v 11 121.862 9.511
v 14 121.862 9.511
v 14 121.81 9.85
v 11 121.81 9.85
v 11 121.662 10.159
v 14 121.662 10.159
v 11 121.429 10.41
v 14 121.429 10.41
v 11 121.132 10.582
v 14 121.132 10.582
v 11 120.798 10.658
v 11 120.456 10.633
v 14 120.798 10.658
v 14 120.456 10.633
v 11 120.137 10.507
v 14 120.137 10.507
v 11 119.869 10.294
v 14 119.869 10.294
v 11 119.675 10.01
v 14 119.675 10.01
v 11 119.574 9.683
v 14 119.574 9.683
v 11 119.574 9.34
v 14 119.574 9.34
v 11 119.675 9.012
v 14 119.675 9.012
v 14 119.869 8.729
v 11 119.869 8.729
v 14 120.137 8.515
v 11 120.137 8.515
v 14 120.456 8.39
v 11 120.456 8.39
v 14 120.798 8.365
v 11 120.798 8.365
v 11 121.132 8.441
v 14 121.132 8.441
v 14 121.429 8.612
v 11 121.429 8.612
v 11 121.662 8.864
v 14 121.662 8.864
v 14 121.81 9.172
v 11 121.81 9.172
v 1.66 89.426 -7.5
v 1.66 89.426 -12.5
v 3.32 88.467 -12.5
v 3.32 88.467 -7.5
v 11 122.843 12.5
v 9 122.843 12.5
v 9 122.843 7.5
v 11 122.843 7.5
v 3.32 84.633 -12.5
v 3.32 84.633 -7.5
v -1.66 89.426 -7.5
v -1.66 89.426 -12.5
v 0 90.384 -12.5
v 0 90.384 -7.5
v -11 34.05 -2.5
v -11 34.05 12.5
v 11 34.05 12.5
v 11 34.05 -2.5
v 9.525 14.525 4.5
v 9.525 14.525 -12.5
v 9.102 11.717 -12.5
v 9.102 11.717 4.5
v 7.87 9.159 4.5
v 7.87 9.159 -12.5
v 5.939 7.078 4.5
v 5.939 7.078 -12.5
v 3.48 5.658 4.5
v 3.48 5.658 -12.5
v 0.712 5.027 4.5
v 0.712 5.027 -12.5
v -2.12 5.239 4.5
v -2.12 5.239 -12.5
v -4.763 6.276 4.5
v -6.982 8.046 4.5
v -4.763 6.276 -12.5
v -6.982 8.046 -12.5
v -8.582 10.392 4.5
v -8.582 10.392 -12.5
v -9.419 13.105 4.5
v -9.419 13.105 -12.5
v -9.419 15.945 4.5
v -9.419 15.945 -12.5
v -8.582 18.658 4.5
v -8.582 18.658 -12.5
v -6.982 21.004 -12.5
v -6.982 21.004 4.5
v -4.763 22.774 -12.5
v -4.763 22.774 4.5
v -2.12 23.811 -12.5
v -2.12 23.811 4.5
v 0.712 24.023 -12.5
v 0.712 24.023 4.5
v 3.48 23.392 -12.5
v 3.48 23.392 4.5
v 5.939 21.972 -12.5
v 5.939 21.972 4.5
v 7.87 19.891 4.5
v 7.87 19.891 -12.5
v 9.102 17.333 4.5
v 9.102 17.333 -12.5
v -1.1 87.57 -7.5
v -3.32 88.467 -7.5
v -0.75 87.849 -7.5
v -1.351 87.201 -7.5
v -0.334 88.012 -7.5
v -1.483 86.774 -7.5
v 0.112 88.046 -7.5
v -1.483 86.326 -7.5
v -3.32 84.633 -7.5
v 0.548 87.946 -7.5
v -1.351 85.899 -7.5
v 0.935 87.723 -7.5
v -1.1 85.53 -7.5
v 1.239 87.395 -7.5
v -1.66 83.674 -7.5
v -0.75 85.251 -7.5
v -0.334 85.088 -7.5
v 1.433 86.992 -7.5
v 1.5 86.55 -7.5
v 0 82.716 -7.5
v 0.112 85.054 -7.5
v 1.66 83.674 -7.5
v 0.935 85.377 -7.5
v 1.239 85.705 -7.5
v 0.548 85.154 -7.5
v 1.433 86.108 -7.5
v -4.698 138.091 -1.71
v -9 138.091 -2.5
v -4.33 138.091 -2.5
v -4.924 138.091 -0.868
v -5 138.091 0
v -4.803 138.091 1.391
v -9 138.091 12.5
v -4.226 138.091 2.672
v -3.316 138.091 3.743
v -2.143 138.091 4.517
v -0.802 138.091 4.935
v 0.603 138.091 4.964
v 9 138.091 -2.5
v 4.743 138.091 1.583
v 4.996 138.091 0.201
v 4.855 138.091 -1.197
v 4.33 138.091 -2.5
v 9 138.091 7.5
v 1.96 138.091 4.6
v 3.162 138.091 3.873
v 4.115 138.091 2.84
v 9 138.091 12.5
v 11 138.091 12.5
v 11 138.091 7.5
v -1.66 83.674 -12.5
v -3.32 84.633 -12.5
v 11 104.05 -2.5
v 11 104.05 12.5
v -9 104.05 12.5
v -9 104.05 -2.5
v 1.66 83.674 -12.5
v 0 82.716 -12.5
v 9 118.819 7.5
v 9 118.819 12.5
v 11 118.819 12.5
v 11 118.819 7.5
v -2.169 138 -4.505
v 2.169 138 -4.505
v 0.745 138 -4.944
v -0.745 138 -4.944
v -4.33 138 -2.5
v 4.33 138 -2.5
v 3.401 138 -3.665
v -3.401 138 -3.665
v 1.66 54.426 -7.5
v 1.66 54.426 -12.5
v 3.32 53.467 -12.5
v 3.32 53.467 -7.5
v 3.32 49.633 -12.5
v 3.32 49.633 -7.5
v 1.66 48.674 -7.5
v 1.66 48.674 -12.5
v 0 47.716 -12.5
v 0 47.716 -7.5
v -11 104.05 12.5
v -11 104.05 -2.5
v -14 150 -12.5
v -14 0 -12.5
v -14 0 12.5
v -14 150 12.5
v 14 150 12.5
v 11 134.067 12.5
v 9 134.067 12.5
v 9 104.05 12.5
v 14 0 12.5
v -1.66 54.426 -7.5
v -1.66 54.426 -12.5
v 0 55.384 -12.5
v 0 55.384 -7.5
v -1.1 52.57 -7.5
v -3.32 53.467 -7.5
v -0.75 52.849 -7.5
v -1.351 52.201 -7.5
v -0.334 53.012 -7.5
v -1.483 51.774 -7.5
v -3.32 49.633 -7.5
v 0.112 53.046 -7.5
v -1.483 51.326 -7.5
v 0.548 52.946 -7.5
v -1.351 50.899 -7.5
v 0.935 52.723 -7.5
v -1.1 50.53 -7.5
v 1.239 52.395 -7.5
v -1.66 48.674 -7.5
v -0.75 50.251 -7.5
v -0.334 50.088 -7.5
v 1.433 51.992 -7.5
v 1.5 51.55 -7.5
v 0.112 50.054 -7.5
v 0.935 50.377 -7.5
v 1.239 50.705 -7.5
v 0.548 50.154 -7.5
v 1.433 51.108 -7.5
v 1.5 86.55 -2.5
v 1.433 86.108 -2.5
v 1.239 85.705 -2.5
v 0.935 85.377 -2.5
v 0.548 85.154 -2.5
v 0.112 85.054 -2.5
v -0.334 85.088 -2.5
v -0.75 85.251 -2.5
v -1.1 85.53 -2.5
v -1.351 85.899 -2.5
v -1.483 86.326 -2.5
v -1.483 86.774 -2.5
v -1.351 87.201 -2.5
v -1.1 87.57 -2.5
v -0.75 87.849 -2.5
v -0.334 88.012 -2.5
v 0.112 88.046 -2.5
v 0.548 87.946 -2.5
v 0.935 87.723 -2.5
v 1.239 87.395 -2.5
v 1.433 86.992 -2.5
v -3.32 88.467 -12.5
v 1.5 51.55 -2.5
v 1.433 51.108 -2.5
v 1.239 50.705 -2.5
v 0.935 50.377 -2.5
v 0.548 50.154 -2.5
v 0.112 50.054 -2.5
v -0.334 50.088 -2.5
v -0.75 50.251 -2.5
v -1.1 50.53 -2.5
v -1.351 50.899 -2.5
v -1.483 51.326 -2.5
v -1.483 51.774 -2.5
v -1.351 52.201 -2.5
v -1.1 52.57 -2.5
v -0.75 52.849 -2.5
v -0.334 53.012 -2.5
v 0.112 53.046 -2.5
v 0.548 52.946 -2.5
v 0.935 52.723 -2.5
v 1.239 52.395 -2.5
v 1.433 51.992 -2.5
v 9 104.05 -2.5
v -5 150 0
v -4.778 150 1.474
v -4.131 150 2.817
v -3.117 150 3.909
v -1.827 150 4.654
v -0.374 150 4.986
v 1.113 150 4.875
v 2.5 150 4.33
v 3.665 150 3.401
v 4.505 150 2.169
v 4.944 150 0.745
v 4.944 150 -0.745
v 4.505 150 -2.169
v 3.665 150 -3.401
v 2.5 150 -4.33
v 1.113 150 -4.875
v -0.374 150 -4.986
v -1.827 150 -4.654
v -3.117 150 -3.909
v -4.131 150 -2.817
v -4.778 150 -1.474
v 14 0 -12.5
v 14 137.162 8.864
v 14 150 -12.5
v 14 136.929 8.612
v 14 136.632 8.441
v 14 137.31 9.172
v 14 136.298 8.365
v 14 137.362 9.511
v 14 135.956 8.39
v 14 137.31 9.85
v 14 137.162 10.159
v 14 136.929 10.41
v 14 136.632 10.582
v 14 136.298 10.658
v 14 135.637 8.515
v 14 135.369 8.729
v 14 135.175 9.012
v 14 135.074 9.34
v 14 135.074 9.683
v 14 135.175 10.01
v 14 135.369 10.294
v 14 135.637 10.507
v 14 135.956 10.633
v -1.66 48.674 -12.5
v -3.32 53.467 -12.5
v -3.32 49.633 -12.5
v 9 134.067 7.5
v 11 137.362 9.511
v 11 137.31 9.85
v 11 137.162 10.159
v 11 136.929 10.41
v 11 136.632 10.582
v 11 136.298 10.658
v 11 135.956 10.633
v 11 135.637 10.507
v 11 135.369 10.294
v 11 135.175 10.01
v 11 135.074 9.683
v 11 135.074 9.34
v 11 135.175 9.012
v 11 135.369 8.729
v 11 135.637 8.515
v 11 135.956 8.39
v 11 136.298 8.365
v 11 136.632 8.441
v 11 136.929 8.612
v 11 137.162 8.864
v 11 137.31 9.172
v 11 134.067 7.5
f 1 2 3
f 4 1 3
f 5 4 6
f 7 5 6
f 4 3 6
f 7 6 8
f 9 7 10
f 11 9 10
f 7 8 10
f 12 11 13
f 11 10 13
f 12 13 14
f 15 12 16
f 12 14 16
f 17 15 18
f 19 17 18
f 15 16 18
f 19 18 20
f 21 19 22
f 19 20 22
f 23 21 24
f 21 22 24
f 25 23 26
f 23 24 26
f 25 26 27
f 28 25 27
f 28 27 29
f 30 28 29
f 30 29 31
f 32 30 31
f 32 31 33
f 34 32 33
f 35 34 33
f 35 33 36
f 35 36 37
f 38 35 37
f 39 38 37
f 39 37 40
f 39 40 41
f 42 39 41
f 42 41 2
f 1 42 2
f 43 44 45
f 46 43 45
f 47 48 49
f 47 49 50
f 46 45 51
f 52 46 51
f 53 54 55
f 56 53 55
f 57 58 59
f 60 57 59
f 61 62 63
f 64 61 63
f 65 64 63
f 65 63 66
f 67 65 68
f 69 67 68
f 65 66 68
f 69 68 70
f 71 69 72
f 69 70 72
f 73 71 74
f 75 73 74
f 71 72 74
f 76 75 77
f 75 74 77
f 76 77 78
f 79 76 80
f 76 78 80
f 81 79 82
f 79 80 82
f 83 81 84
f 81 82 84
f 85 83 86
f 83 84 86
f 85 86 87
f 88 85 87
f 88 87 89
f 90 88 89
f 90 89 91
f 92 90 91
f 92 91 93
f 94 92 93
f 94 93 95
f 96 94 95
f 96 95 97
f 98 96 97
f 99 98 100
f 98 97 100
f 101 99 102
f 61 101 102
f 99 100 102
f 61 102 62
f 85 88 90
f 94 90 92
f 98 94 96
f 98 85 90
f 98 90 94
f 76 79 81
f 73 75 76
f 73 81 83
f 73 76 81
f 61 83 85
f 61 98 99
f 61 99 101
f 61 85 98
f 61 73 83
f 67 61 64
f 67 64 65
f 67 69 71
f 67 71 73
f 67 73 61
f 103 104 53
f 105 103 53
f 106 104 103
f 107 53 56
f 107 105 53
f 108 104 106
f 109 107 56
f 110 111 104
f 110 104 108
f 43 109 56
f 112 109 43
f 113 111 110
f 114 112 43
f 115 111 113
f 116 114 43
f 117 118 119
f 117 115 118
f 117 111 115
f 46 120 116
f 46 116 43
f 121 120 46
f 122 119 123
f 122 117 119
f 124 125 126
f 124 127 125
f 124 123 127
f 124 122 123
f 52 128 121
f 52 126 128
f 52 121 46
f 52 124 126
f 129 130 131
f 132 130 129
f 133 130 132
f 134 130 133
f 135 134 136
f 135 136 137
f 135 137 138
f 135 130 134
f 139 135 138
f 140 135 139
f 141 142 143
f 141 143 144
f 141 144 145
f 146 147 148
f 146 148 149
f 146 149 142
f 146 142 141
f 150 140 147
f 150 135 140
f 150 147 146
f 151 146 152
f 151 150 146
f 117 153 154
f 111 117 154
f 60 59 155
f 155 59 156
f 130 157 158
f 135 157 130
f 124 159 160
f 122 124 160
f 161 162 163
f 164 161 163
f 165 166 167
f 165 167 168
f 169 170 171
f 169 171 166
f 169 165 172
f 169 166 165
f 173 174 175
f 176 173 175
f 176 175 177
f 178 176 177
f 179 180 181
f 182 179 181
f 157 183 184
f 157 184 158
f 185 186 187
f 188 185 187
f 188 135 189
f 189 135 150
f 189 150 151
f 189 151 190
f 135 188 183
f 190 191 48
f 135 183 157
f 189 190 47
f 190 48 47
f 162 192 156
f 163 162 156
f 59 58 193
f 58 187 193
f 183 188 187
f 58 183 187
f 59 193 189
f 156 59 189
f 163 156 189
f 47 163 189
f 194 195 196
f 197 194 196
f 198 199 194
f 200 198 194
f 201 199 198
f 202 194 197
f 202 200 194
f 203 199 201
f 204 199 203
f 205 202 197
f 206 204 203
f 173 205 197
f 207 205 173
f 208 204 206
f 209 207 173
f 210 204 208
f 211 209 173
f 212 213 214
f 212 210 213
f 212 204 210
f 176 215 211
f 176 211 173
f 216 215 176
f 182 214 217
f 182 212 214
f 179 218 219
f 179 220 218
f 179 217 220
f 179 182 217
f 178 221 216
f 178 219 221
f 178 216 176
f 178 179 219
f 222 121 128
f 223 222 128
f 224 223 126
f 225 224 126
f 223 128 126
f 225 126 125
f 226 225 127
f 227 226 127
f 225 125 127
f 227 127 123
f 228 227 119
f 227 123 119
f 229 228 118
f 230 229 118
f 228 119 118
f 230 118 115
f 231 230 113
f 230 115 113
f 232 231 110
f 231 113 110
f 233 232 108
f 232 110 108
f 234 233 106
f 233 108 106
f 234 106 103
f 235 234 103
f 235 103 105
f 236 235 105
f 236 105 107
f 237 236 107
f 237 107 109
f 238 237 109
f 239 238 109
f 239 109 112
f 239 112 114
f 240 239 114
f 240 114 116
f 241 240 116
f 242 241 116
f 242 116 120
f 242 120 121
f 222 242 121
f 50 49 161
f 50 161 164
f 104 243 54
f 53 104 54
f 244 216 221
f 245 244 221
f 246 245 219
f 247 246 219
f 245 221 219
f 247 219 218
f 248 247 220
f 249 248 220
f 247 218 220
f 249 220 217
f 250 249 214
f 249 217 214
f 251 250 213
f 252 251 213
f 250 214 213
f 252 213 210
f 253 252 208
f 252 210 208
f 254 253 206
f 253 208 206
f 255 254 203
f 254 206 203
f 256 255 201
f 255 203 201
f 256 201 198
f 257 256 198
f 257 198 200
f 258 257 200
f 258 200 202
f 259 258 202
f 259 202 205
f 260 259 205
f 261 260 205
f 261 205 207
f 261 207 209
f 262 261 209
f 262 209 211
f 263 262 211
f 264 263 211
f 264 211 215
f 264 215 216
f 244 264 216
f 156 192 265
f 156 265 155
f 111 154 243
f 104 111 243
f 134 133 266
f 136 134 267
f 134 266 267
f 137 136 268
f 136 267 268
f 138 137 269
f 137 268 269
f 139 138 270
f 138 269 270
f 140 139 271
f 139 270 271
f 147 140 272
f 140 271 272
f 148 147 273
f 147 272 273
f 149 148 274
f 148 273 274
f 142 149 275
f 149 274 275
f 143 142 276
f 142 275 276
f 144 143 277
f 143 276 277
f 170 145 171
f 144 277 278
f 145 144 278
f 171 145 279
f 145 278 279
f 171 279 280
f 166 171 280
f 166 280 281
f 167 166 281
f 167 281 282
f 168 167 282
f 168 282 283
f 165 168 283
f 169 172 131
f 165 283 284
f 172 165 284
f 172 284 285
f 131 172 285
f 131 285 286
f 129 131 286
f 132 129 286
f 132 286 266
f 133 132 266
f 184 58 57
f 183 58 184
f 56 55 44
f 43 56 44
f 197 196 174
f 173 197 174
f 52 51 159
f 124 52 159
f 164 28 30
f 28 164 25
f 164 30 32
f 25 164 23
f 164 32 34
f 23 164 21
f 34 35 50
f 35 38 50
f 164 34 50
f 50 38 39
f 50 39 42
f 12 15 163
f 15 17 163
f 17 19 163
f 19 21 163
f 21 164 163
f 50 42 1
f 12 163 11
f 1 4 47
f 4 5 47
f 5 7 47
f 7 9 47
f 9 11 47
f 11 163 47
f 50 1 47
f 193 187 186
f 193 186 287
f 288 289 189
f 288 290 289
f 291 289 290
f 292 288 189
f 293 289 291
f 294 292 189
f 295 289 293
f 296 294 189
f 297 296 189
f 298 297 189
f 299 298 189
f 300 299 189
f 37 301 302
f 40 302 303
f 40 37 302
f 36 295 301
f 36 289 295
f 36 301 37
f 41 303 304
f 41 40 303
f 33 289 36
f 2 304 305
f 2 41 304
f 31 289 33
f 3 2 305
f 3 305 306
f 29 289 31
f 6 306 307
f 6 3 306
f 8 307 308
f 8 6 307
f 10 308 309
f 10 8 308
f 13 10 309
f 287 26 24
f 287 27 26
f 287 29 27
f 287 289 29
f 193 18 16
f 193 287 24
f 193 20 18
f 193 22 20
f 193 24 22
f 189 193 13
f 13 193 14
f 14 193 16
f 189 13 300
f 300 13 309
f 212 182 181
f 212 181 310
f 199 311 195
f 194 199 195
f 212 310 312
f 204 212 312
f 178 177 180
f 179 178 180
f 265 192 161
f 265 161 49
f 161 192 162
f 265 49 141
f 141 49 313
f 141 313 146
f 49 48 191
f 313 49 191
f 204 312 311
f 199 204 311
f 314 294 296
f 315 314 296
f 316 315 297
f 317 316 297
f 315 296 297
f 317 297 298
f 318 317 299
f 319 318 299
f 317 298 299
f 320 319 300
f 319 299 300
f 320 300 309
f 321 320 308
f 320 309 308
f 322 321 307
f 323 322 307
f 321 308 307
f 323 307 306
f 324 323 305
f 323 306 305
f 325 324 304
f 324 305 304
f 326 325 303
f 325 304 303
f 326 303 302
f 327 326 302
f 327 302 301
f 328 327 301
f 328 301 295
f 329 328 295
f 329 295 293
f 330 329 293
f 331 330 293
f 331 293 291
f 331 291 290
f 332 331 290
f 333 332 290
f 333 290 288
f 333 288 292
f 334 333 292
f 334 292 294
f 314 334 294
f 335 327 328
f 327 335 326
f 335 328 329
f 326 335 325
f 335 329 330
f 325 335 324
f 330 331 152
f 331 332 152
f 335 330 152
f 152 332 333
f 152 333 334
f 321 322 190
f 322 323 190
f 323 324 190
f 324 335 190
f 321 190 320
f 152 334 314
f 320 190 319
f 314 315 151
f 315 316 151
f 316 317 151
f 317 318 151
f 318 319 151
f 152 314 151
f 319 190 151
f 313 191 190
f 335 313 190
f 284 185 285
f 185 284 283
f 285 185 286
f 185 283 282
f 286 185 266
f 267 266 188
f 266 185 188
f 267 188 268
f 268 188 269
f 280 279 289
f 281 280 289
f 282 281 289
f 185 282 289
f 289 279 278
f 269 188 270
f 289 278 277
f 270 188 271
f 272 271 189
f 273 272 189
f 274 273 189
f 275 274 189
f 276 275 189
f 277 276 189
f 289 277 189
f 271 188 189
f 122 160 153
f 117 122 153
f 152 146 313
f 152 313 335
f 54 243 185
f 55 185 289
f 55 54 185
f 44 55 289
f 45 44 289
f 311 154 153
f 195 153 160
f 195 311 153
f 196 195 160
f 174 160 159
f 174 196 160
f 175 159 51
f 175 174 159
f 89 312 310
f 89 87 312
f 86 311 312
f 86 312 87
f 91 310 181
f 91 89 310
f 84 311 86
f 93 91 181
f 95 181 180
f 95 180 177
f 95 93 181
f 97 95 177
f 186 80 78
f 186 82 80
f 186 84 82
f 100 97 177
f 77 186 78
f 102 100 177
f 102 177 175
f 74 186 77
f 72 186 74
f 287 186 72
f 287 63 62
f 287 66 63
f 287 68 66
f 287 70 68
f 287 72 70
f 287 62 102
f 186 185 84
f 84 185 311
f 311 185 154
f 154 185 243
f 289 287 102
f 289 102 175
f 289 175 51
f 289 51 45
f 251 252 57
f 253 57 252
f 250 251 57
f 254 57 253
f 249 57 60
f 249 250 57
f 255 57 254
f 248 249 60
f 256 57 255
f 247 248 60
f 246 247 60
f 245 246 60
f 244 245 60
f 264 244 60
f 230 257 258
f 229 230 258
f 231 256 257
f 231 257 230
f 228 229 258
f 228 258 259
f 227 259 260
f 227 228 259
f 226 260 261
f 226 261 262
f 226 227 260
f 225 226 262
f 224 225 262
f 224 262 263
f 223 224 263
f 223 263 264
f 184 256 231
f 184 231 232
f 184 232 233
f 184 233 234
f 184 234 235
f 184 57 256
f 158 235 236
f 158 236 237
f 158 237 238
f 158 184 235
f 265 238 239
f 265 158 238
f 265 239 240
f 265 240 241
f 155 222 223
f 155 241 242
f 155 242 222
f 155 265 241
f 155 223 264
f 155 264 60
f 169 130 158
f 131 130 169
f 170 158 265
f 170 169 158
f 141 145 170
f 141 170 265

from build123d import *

# Parameters (mm, degrees)
F0_W      = 28
F0_H      = 25
F1_DEPTH  = 150
F2_R      = 9.525
F3_DEPTH  = 17
F4_R      = 1.5
F5_DEPTH  = 5
F6_R      = 1.5
F7_DEPTH  = 25.001
F8_W      = 22
F8_H      = 70
F9_DEPTH  = 15
F10_R     = 1.15
F11_DEPTH = 5
F12_W     = 2
F12_H     = 4.0241825168
F13_DEPTH = 5
F14_W     = 18
F14_H     = 19.2723592291
F15_DEPTH = 15
F16_W     = 18
F16_H     = 14.7685540254
F17_DEPTH = 15
F18_R     = 5
F19_DEPTH = 12


# Not quite as in the source:
# - the program builds the solid bodies; features that only make, move or delete a surface that nothing else refers to are left out


with BuildPart() as f1:
    # F0 (on Front) → F1 (new body)
    with BuildSketch(Plane.XZ):
        Rectangle(F0_W, F0_H)
    extrude(amount=-F1_DEPTH)

    # F2 (on face) → F3 (cut)
    with BuildSketch(Plane(origin=(0, 0, -12.5), x_dir=(1, 0, 0), z_dir=(0, 0, -1))):
        with Locations((0, -14.525)):
            Circle(F2_R)
    extrude(amount=-F3_DEPTH, mode=Mode.SUBTRACT)

    # F4 (on face) → F5 (cut)
    with BuildSketch(Plane(origin=(0, 0, -12.5), x_dir=(1, 0, 0), z_dir=(0, 0, -1))):
        with BuildLine():
            ThreePointArc((1.6602502077, -54.4256372334), (2.8756374132, -53.2102498962), (3.3205, -51.55))
            ThreePointArc((3.3205, -51.55), (2.8756373339, -49.8897499664), (1.6602499328, -48.6743626079))
            ThreePointArc((1.6602499328, -48.6743626079), (-1.397e-07, -48.2295), (-1.6602501748, -48.6743627476))
            ThreePointArc((-1.6602501748, -48.6743627476), (-2.8756374037, -49.8897500874), (-3.3205, -51.55))
            ThreePointArc((-3.3205, -51.55), (-2.8756373712, -53.210249969), (-1.660250062, -54.4256373175))
            ThreePointArc((-1.660250062, -54.4256373175), (8.41e-08, -54.8705), (1.6602502077, -54.4256372334))
        make_face()
        with Locations((0, -51.55)):
            Circle(F4_R, mode=Mode.SUBTRACT)
        with BuildLine():
            Line((3.3205, -53.4670915688), (3.3205, -51.55))
            ThreePointArc((3.3205, -51.55), (2.8756374132, -53.2102498962), (1.6602502077, -54.4256372334))
            Line((1.6602502077, -54.4256372334), (3.3205, -53.4670915688))
        make_face()
        with BuildLine():
            ThreePointArc((1.6602499328, -48.6743626079), (2.8756373339, -49.8897499664), (3.3205, -51.55))
            Line((3.3205, -51.55), (3.3205, -49.6329084312))
            Line((3.3205, -49.6329084312), (1.6602499328, -48.6743626079))
        make_face()
        with BuildLine():
            ThreePointArc((-1.6602501748, -48.6743627476), (-1.397e-07, -48.2295), (1.6602499328, -48.6743626079))
            Line((1.6602499328, -48.6743626079), (0, -47.7158168623))
            Line((0, -47.7158168623), (-1.6602501748, -48.6743627476))
        make_face()
        with BuildLine():
            Line((0, -55.3841831377), (1.6602502077, -54.4256372334))
            ThreePointArc((1.6602502077, -54.4256372334), (8.41e-08, -54.8705), (-1.660250062, -54.4256373175))
            Line((-1.660250062, -54.4256373175), (0, -55.3841831377))
        make_face()
        with BuildLine():
            ThreePointArc((-3.3205, -51.55), (-2.8756374037, -49.8897500874), (-1.6602501748, -48.6743627476))
            Line((-1.6602501748, -48.6743627476), (-3.3205, -49.6329084312))
            Line((-3.3205, -49.6329084312), (-3.3205, -51.55))
        make_face()
        with BuildLine():
            Line((-3.3205, -53.4670915688), (-1.660250062, -54.4256373175))
            ThreePointArc((-1.660250062, -54.4256373175), (-2.8756373712, -53.210249969), (-3.3205, -51.55))
            Line((-3.3205, -51.55), (-3.3205, -53.4670915688))
        make_face()
        with BuildLine():
            ThreePointArc((1.6602500198, -89.4256373418), (2.875637359, -88.2102499901), (3.3205, -86.55))
            ThreePointArc((3.3205, -86.55), (2.8756374351, -84.8897501418), (1.6602502837, -83.6743628105))
            ThreePointArc((1.6602502837, -83.6743628105), (-2.2e-09, -83.2295), (-1.6602502875, -83.6743628127))
            ThreePointArc((-1.6602502875, -83.6743628127), (-2.8756374363, -84.8897501438), (-3.3205, -86.55))
            ThreePointArc((-3.3205, -86.55), (-2.875637359, -88.2102499901), (-1.6602500198, -89.4256373418))
            ThreePointArc((-1.6602500198, -89.4256373418), (0, -89.8705), (1.6602500198, -89.4256373418))
        make_face()
        with Locations((0, -86.55)):
            Circle(F4_R, mode=Mode.SUBTRACT)
        with BuildLine():
            Line((3.3205, -88.4670915688), (3.3205, -86.55))
            ThreePointArc((3.3205, -86.55), (2.875637359, -88.2102499901), (1.6602500198, -89.4256373418))
            Line((1.6602500198, -89.4256373418), (3.3205, -88.4670915688))
        make_face()
        with BuildLine():
            ThreePointArc((1.6602502837, -83.6743628105), (2.8756374351, -84.8897501418), (3.3205, -86.55))
            Line((3.3205, -86.55), (3.3205, -84.6329084312))
            Line((3.3205, -84.6329084312), (1.6602502837, -83.6743628105))
        make_face()
        with BuildLine():
            ThreePointArc((-1.6602502875, -83.6743628127), (-2.2e-09, -83.2295), (1.6602502837, -83.6743628105))
            Line((1.6602502837, -83.6743628105), (0, -82.7158168623))
            Line((0, -82.7158168623), (-1.6602502875, -83.6743628127))
        make_face()
        with BuildLine():
            Line((0, -90.3841831377), (1.6602500198, -89.4256373418))
            ThreePointArc((1.6602500198, -89.4256373418), (0, -89.8705), (-1.6602500198, -89.4256373418))
            Line((-1.6602500198, -89.4256373418), (0, -90.3841831377))
        make_face()
        with BuildLine():
            ThreePointArc((-3.3205, -86.55), (-2.8756374363, -84.8897501438), (-1.6602502875, -83.6743628127))
            Line((-1.6602502875, -83.6743628127), (-3.3205, -84.6329084312))
            Line((-3.3205, -84.6329084312), (-3.3205, -86.55))
        make_face()
        with BuildLine():
            Line((-3.3205, -88.4670915688), (-1.6602500198, -89.4256373418))
            ThreePointArc((-1.6602500198, -89.4256373418), (-2.875637359, -88.2102499901), (-3.3205, -86.55))
            Line((-3.3205, -86.55), (-3.3205, -88.4670915688))
        make_face()
    extrude(amount=-F5_DEPTH, mode=Mode.SUBTRACT)

    # F6 (on face) → F7 (cut, through all)
    with BuildSketch(Plane(origin=(0, 0, -12.5), x_dir=(1, 0, 0), z_dir=(0, 0, -1))):
        with Locations((0, -51.55)):
            Circle(F6_R)
        with Locations((0, -86.55)):
            Circle(F6_R)
    extrude(amount=-F7_DEPTH, mode=Mode.SUBTRACT)

    # F8 (on face) → F9 (cut)
    with BuildSketch(Plane.XY.offset(12.5)):
        with Locations((0, 69.05)):
            Rectangle(F8_W, F8_H)
    extrude(amount=-F9_DEPTH, mode=Mode.SUBTRACT)

    # F10 (on face) → F11 (cut)
    with BuildSketch(Plane.YZ.offset(14)):
        with Locations((136.2115726471, 9.5113839224)):
            Circle(F10_R)
        with Locations((120.7115726471, 9.5113839224)):
            Circle(F10_R)
    extrude(amount=-F11_DEPTH, mode=Mode.SUBTRACT)

    # F12 (on face) → F13 (cut)
    with BuildSketch(Plane.XY.offset(12.5)):
        with Locations((10, 120.8306452838)):
            Rectangle(F12_W, F12_H)
        with Locations((10, 136.0788219961)):
            Rectangle(F12_W, F12_H)
    extrude(amount=-F13_DEPTH, mode=Mode.SUBTRACT)

    # F14 (on face) → F15 (cut)
    with BuildSketch(Plane.XY.offset(12.5)):
        with Locations((0, 128.45473364)):
            Rectangle(F14_W, F14_H)
    extrude(amount=-F15_DEPTH, mode=Mode.SUBTRACT)

    # F16 (on face) → F17 (cut)
    with BuildSketch(Plane.XY.offset(12.5)):
        with Locations((0, 111.4342770127)):
            Rectangle(F16_W, F16_H)
    extrude(amount=-F17_DEPTH, mode=Mode.SUBTRACT)

    # F18 (on face) → F19 (cut)
    with BuildSketch(Plane(origin=(0, 150, 0), x_dir=(-1, 0, 0), z_dir=(0, 1, 0))):
        Circle(F18_R)
    extrude(amount=-F19_DEPTH, mode=Mode.SUBTRACT)


solid = f1.part
